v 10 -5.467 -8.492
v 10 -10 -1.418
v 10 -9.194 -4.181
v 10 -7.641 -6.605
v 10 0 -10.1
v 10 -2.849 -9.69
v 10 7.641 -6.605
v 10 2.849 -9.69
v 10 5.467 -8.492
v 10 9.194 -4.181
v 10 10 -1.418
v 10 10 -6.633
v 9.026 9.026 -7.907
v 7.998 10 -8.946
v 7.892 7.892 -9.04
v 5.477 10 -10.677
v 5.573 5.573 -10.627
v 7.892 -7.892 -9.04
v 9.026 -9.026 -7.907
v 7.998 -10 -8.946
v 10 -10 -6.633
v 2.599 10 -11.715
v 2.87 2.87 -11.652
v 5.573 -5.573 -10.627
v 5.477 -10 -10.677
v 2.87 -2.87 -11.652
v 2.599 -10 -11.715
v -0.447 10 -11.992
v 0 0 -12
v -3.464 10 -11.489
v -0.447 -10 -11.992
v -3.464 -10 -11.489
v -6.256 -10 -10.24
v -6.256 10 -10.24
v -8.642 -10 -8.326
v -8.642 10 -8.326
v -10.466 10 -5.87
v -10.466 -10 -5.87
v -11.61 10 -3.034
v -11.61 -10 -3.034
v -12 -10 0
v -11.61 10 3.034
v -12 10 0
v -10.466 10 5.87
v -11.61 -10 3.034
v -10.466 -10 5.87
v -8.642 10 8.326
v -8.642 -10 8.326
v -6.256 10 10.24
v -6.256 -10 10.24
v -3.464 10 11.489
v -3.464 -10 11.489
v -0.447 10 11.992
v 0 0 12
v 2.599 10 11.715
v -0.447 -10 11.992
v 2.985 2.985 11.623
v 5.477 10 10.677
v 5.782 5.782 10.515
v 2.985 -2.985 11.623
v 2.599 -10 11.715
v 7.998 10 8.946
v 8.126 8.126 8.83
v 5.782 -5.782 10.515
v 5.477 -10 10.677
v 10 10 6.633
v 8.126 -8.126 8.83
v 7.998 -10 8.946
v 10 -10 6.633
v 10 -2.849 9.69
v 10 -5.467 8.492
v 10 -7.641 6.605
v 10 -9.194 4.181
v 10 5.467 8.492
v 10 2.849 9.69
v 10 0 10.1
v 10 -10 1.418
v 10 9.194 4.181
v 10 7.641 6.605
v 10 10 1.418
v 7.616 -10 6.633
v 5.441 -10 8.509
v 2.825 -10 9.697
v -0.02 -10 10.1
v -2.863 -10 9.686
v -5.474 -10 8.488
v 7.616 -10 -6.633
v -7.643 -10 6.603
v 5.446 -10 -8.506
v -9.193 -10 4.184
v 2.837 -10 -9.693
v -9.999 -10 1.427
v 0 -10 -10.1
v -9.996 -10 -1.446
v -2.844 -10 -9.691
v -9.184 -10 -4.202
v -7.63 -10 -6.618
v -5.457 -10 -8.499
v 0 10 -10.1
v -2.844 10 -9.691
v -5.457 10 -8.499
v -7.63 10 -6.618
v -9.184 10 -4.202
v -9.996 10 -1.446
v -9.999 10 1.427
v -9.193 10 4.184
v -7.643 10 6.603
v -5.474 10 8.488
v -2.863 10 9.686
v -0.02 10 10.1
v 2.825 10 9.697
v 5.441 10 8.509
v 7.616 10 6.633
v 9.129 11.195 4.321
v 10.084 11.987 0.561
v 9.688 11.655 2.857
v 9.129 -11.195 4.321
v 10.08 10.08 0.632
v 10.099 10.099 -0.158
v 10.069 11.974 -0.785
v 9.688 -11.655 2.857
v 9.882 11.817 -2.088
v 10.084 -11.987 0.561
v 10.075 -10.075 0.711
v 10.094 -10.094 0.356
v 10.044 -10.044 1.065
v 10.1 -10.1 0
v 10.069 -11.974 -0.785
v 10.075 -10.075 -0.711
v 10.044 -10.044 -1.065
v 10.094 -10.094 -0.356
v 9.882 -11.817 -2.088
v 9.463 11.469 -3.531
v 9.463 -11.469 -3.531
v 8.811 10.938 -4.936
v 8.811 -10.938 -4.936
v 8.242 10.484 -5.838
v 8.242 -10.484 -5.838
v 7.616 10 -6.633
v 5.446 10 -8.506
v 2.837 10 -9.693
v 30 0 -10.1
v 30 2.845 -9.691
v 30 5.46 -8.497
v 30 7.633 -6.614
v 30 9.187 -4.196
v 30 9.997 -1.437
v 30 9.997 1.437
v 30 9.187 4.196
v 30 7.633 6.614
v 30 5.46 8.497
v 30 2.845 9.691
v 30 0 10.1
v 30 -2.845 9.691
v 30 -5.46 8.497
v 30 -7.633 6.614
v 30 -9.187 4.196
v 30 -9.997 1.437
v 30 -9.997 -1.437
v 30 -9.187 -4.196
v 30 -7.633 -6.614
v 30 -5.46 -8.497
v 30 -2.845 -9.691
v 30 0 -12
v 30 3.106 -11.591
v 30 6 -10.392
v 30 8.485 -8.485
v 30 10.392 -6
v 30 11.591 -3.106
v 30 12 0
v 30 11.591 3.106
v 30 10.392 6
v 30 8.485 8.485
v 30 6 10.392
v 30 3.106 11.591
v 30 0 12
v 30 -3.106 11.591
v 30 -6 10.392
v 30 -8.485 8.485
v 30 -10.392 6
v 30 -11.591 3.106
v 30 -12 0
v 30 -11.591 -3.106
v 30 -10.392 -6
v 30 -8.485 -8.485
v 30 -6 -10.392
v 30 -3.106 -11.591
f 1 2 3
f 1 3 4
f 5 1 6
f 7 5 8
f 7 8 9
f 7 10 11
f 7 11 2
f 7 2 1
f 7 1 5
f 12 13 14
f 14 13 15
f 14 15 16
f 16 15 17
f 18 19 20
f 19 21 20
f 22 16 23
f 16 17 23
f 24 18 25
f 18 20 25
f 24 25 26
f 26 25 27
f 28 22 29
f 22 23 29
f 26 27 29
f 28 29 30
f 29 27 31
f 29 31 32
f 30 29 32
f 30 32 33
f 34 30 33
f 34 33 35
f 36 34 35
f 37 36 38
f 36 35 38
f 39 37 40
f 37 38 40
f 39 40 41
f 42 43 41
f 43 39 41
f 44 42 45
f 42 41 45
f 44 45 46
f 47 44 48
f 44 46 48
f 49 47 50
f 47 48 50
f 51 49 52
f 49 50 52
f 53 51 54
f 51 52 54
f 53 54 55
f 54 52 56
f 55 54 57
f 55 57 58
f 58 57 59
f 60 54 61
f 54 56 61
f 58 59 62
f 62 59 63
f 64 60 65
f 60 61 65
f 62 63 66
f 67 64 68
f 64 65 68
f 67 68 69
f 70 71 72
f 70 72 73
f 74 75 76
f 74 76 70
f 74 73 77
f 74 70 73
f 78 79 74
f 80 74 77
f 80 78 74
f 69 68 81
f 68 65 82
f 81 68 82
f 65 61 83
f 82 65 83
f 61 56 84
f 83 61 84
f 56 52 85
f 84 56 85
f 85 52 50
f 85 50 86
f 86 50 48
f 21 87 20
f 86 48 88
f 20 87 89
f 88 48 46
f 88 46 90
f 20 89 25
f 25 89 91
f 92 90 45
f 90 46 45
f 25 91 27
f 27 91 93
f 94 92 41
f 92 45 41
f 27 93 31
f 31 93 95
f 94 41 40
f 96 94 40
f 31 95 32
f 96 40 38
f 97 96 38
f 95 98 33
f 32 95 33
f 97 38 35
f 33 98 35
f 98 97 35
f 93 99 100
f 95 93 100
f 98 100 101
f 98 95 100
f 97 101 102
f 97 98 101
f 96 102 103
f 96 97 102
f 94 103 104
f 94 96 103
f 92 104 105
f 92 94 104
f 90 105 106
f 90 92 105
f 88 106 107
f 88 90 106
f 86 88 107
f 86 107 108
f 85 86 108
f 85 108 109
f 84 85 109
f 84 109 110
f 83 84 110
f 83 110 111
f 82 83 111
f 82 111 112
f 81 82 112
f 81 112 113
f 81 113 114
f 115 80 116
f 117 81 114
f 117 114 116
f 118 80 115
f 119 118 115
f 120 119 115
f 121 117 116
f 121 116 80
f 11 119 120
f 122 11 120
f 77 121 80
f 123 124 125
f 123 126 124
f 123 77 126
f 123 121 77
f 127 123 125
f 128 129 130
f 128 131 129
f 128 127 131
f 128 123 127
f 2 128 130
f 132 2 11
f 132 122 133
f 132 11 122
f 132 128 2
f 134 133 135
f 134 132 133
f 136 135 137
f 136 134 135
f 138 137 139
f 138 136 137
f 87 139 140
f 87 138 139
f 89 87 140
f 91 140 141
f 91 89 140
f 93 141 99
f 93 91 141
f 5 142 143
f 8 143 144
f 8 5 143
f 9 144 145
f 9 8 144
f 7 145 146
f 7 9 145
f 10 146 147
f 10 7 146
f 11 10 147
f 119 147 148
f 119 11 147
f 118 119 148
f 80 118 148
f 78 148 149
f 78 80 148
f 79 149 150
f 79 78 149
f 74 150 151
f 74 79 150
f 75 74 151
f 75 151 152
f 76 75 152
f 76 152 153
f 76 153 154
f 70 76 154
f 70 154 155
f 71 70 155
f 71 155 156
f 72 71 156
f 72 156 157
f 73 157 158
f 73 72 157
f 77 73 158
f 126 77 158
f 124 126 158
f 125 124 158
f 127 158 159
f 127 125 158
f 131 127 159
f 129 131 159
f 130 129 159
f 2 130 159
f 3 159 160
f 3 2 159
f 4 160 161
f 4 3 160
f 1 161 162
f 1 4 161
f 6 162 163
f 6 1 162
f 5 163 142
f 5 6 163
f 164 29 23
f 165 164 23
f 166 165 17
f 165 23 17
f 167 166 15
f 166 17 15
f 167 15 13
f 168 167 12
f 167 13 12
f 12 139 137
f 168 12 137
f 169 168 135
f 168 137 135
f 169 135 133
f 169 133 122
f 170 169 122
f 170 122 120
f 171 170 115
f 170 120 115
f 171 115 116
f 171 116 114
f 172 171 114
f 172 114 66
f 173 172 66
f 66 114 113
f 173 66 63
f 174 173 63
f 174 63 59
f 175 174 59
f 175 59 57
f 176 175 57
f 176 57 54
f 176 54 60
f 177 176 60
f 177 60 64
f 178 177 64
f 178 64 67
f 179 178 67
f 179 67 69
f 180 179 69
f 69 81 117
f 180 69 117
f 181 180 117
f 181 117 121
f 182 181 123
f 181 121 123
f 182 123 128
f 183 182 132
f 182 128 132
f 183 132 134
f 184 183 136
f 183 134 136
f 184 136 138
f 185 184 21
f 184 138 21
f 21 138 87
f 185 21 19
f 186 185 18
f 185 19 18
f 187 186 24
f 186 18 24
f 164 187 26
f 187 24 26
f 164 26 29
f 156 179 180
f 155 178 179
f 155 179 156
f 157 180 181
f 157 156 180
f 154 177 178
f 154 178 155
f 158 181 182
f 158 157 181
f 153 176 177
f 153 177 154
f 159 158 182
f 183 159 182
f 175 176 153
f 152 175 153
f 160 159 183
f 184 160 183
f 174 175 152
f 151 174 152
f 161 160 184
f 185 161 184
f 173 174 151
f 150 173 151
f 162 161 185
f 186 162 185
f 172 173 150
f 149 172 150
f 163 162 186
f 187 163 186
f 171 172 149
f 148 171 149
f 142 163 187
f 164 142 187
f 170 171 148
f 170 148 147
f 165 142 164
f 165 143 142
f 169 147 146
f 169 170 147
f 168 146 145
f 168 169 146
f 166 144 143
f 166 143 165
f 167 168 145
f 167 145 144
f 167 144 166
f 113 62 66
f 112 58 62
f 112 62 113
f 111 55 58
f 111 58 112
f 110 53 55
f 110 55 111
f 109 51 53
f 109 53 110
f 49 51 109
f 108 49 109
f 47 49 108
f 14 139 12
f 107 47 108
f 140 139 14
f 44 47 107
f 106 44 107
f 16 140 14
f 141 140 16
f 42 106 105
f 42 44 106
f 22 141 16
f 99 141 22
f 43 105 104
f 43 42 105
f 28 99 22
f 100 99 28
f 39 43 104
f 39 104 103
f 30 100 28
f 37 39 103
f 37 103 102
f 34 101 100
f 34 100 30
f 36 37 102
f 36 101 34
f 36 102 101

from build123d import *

# Parameters (mm, degrees)
CYLINDER002_R           = 10.1
CYLINDER002_DEPTH       = 20
CYLINDER002_PITCH_ANGLE = 90
CYLINDER003_R           = 10.1
CYLINDER003_DEPTH       = 30
CYLINDER_R              = 12
CYLINDER_DEPTH          = 30
CYLINDER_PITCH_ANGLE    = 90
CYLINDER001_R           = 12
CYLINDER001_DEPTH       = 20


with BuildPart() as cylinder002:
    # Cylinder002 → Cylinder002 (new body)
    with BuildSketch(Plane.XY):
        Circle(CYLINDER002_R)
    extrude(amount=CYLINDER002_DEPTH)


with BuildPart() as cylinder002_1:
    # Cylinder002 pitch: moved
    add(cylinder002.part.rotate(Axis((0, 0, 0), (0, 1, 0)), CYLINDER002_PITCH_ANGLE))


with BuildPart() as cylinder002_2:
    # Cylinder002 placement: moved
    add(cylinder002_1.part.moved(Location((10, 0, 0))))


with BuildPart() as negative_fusion:
    # Cylinder003 → Cylinder003 (new body)
    with BuildSketch(Plane(origin=(0, -15, 0), x_dir=(0, 0, -1), z_dir=(0, 1, 0))):
        Circle(CYLINDER003_R)
    extrude(amount=CYLINDER003_DEPTH)

    # Fusion001: union Cylinder002
    add(cylinder002_2.part)


with BuildPart() as cylinder:
    # Cylinder → Cylinder (new body)
    with BuildSketch(Plane.XY):
        Circle(CYLINDER_R)
    extrude(amount=CYLINDER_DEPTH)


with BuildPart() as cylinder_1:
    # Cylinder pitch: moved
    add(cylinder.part.rotate(Axis((0, 0, 0), (0, 1, 0)), CYLINDER_PITCH_ANGLE))


with BuildPart() as cylinder_2:
    # Cylinder placement: moved
    add(cylinder_1.part)


with BuildPart() as cut:
    # Cylinder001 → Cylinder001 (new body)
    with BuildSketch(Plane(origin=(0, -10, 0), x_dir=(0, 0, -1), z_dir=(0, 1, 0))):
        Circle(CYLINDER001_R)
    extrude(amount=CYLINDER001_DEPTH)

    # Fusion: union Cylinder
    add(cylinder_2.part)

    # Cut: cut Negative Fusion
    add(negative_fusion.part, mode=Mode.SUBTRACT)


solid = cut.part
